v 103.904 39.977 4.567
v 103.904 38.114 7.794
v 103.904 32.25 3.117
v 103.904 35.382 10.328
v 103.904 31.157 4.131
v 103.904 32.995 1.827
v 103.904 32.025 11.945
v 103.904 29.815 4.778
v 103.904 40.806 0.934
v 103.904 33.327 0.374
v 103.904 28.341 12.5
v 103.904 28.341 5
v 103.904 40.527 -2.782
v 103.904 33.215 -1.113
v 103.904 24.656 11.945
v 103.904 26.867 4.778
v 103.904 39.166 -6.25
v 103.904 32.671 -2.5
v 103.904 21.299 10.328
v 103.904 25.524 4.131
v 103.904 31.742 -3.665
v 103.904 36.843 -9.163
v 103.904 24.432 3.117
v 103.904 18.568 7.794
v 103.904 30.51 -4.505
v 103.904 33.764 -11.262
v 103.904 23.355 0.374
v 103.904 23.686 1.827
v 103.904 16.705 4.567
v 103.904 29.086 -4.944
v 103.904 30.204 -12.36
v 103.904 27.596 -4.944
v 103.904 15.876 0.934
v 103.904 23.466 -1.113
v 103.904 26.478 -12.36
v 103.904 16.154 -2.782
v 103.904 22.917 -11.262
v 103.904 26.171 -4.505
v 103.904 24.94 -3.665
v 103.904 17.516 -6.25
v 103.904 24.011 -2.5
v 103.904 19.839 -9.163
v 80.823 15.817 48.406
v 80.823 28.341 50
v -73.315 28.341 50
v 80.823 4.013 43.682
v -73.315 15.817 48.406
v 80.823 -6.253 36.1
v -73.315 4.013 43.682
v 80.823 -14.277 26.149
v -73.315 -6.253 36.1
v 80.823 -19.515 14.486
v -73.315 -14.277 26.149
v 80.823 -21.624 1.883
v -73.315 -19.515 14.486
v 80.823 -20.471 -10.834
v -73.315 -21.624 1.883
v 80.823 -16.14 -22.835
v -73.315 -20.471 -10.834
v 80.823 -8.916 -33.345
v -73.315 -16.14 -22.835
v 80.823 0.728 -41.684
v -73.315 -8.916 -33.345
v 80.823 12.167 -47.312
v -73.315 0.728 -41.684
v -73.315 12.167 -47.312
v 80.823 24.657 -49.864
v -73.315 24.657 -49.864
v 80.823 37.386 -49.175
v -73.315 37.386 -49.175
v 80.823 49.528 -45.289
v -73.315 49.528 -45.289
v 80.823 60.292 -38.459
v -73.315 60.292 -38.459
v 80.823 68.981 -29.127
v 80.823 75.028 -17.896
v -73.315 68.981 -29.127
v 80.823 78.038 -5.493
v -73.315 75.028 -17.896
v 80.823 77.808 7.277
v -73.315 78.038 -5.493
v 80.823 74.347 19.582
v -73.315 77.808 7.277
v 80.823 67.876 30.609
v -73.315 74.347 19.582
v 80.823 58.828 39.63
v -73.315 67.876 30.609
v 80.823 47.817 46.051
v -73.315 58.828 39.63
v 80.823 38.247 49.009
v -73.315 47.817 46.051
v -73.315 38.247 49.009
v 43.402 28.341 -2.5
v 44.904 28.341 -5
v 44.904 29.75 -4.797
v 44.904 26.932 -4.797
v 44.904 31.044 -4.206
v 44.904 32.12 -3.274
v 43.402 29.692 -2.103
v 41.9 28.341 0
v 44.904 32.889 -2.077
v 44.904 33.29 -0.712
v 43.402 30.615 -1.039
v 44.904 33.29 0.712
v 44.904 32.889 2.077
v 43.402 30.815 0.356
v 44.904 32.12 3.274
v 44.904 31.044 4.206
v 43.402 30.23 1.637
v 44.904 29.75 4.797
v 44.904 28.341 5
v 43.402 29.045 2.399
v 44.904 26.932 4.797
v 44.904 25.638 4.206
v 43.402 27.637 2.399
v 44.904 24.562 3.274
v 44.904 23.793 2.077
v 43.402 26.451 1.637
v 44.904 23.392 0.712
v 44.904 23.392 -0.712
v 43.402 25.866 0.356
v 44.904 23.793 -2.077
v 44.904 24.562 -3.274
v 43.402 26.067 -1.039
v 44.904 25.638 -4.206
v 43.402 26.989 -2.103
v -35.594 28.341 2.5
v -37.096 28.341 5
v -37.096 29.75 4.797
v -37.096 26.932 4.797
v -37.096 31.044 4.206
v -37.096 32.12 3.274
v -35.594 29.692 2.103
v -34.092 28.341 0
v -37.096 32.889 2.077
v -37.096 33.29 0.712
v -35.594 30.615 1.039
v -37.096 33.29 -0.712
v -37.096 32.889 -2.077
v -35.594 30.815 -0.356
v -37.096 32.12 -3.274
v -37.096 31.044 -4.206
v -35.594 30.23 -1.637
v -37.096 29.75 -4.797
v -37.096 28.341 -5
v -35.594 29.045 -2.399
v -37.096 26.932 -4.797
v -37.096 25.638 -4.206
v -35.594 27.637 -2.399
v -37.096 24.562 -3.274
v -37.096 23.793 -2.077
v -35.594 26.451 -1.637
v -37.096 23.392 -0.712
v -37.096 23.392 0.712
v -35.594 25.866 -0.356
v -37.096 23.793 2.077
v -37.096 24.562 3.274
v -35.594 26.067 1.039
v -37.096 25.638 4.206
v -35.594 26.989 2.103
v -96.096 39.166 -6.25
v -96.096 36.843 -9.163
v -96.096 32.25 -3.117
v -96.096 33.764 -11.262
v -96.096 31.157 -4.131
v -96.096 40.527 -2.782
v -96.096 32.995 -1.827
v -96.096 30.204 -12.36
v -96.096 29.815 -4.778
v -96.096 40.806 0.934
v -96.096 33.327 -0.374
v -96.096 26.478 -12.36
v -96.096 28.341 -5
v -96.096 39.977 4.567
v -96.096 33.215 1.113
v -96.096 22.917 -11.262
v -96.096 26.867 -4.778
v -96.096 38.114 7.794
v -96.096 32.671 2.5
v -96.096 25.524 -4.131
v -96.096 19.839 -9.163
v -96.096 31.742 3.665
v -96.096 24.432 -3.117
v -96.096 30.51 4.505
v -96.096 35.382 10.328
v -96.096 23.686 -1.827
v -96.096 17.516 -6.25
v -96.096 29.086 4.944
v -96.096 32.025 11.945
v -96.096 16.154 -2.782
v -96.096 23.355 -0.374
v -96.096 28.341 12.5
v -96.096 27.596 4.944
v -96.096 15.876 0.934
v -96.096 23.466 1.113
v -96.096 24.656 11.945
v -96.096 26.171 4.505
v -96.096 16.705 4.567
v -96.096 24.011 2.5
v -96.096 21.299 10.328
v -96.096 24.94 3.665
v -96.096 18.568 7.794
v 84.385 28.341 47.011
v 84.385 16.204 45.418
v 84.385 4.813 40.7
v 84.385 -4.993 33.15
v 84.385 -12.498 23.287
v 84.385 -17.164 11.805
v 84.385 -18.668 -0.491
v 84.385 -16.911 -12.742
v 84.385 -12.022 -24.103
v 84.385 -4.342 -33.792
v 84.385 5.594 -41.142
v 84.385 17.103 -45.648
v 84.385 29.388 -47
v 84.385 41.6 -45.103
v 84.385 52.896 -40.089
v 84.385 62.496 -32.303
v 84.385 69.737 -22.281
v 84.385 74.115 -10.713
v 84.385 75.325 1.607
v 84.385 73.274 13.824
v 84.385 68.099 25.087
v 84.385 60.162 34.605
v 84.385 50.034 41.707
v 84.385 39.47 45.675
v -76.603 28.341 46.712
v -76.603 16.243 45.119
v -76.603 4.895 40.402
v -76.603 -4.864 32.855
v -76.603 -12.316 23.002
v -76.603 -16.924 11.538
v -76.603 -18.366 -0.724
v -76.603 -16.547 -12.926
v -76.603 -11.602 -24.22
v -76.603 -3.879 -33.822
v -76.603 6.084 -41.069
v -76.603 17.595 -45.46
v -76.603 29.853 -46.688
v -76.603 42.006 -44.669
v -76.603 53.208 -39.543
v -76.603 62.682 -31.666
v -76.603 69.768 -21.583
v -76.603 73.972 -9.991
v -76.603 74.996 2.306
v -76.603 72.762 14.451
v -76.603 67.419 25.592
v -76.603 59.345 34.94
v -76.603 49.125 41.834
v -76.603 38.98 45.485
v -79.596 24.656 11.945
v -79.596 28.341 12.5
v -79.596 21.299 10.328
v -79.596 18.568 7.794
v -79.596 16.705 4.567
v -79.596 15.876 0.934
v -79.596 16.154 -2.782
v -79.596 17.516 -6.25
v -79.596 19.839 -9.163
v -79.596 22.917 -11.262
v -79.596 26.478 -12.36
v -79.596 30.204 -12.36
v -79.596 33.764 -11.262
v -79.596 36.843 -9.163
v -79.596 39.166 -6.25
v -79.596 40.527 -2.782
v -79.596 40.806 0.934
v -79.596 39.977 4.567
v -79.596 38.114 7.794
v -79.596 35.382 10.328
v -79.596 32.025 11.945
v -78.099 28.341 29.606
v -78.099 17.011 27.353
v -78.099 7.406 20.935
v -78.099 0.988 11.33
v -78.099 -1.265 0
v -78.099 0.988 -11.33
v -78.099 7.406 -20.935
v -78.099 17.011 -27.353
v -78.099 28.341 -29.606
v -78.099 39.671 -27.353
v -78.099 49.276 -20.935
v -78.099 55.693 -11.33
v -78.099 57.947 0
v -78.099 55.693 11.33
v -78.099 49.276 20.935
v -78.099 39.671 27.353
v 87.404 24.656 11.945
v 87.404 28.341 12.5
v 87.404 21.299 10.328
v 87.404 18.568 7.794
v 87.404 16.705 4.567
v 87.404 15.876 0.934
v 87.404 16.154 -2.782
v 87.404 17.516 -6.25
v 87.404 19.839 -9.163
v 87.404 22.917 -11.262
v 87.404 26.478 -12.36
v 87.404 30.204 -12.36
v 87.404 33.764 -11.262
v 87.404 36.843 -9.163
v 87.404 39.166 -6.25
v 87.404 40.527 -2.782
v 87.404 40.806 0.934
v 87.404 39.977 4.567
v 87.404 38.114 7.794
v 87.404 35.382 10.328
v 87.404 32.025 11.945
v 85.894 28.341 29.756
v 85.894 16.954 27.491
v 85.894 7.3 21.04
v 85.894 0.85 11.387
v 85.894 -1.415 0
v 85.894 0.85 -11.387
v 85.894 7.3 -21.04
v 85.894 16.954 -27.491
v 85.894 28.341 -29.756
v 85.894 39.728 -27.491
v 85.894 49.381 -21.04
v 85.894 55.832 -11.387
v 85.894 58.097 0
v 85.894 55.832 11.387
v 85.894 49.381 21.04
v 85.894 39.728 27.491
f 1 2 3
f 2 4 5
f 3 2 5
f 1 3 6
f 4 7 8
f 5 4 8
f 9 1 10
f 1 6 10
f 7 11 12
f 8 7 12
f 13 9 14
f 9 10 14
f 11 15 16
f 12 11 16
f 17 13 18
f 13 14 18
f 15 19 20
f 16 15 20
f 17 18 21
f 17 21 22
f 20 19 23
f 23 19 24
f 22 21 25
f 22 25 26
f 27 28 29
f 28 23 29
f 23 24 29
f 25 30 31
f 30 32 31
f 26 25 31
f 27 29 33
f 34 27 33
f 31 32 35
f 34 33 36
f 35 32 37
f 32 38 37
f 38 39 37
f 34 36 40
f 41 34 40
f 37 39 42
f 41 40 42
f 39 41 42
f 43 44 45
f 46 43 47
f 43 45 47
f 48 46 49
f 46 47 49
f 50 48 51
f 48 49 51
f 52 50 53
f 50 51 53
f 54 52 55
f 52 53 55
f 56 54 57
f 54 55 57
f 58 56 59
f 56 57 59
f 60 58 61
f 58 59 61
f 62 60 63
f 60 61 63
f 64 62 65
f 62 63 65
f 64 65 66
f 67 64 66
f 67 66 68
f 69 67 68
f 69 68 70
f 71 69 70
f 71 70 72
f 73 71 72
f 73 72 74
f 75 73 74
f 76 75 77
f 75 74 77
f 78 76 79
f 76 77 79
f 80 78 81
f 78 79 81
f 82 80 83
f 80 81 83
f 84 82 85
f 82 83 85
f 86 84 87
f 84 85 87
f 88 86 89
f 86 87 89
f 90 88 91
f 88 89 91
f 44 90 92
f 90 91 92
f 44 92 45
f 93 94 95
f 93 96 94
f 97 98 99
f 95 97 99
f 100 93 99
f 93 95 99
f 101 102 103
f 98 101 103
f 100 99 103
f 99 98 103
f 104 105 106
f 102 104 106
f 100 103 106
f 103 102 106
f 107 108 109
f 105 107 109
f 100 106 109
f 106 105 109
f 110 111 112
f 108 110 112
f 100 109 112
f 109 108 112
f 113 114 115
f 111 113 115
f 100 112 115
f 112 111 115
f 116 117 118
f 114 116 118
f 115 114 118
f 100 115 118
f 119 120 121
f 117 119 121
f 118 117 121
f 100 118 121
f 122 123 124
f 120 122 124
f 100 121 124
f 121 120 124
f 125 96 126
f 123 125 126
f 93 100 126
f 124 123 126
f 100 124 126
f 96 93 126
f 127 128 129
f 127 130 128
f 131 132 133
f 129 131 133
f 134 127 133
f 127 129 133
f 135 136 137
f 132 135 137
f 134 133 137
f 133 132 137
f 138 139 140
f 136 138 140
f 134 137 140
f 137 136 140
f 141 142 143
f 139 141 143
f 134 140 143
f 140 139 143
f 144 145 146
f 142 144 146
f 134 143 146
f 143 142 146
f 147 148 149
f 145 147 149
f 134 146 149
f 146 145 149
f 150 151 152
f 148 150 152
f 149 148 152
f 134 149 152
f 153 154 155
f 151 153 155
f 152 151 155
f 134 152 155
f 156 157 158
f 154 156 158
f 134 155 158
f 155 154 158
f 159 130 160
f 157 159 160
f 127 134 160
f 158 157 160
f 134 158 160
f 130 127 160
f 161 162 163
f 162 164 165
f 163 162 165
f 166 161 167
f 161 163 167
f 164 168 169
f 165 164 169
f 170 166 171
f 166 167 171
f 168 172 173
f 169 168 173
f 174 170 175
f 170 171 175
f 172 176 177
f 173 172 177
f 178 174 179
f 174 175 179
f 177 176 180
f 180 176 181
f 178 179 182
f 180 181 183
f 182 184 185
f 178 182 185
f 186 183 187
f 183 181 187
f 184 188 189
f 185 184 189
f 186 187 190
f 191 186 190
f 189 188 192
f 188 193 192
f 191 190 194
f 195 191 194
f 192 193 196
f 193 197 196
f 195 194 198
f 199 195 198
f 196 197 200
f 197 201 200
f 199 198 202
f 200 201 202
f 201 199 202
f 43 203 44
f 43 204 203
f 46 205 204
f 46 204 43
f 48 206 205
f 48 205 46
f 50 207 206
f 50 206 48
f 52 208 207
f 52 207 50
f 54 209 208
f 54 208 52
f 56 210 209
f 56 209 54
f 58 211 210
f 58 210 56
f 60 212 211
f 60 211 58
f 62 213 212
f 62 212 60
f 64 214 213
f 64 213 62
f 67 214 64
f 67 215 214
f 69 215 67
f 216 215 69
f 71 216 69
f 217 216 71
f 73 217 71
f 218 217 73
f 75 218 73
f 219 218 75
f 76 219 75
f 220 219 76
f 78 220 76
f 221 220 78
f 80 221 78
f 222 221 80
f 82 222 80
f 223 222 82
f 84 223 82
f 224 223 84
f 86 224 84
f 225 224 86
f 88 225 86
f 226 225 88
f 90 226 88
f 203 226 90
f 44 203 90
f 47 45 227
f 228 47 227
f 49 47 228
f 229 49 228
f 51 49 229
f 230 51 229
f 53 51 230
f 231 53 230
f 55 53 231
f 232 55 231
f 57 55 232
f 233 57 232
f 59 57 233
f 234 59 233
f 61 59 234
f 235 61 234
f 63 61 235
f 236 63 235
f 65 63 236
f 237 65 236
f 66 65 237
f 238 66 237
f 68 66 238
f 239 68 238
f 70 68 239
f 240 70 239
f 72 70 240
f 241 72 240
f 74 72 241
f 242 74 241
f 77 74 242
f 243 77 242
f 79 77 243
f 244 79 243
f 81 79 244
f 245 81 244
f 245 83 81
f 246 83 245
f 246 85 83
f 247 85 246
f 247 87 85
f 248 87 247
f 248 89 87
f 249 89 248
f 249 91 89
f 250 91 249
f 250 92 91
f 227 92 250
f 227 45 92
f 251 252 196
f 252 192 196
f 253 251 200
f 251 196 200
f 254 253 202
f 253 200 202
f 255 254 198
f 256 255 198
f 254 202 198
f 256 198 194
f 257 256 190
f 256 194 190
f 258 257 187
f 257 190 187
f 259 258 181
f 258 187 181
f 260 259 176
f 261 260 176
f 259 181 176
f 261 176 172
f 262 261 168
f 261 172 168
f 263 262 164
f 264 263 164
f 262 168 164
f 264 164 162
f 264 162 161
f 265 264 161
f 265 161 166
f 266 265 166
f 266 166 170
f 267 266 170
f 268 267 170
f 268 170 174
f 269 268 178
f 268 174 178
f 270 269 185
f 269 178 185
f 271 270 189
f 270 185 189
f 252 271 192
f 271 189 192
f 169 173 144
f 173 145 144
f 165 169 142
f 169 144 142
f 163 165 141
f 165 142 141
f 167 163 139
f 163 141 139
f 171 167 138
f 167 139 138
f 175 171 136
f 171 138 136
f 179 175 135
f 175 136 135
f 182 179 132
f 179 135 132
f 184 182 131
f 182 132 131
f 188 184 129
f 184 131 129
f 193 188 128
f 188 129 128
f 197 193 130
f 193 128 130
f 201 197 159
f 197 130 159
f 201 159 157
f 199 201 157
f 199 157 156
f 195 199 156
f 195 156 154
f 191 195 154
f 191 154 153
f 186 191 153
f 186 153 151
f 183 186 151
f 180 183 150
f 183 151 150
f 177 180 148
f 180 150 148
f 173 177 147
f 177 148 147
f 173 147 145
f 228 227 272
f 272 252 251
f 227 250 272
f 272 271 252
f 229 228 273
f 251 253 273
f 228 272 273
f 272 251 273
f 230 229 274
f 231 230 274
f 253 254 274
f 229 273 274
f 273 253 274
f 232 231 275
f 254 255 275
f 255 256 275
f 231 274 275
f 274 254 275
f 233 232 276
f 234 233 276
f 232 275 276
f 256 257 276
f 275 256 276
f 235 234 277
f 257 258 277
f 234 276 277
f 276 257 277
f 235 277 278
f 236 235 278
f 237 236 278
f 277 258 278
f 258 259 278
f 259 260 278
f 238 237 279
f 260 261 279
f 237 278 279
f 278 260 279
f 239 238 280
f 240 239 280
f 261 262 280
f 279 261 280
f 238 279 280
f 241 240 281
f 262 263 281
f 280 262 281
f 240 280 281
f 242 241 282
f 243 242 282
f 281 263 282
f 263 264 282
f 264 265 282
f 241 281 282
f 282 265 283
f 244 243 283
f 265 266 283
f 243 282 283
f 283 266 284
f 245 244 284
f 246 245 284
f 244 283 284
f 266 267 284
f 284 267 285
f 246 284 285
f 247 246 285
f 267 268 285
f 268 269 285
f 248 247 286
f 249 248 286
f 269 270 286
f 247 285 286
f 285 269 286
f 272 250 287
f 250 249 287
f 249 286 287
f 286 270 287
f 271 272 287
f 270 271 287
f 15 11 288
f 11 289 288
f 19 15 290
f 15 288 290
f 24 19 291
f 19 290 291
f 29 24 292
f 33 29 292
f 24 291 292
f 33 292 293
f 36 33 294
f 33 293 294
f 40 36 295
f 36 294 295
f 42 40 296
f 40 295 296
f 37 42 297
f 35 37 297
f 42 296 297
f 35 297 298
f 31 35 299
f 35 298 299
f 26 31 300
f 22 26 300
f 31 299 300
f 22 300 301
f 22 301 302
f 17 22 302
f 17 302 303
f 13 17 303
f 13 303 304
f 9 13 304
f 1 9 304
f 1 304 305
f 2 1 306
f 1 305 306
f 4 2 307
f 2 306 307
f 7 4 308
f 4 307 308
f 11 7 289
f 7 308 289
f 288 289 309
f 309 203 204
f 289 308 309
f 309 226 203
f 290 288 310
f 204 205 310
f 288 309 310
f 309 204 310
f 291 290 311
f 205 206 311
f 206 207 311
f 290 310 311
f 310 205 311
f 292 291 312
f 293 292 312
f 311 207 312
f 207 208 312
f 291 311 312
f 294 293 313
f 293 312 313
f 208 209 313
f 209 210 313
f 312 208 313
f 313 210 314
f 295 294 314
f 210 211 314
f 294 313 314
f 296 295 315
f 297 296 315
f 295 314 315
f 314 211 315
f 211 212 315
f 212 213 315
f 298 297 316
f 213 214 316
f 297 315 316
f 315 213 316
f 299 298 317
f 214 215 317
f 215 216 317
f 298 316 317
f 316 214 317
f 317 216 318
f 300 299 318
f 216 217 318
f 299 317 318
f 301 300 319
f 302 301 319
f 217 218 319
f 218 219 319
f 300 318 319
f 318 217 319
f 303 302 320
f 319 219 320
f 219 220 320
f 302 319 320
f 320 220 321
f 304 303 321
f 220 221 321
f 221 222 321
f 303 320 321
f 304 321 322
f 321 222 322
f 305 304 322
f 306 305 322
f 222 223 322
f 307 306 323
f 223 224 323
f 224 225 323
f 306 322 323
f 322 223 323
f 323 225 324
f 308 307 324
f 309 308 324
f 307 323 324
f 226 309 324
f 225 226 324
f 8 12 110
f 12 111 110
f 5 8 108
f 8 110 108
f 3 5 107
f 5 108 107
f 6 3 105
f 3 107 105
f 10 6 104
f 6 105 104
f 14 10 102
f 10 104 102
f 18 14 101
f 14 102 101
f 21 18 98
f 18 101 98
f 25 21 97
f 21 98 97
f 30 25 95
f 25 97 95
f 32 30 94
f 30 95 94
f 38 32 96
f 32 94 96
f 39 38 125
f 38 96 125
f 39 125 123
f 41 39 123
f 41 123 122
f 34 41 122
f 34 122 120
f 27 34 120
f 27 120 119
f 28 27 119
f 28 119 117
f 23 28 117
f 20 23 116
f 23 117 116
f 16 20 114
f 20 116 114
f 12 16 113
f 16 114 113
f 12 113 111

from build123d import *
from OCP.BRepFilletAPI import BRepFilletAPI_MakeChamfer

# Parameters (mm, degrees)
CHAMFER1_SIZE              = 3
CHAMFER1_SIZE2             = 3.300188603
F_10_0MM_DOWEL_HOLE1_D     = 10
F_10_0MM_DOWEL_HOLE1_DEPTH = 59
F_10_0MM_DOWEL_HOLE1_TIP   = 3.004303095
F_10_0MM_DOWEL_HOLE2_D     = 10
F_10_0MM_DOWEL_HOLE2_DEPTH = 59
F_10_0MM_DOWEL_HOLE2_TIP   = 3.004303095


with BuildPart() as part:
    # Sketch1 → Revolve1 (revolve)
    with BuildSketch(Plane.XY):
        Polygon((-96.096096096, 28.340840841), (103.903903904, 28.340840841), (103.903903904, 40.840840841), (87.403903904, 40.840840841), (84.123079022, 78.340840841), (-76.315271214, 78.340840841), (-79.596096096, 40.840840841), (-96.096096096, 40.840840841), align=None)
    revolve(axis=Axis((-96.096096096, 28.340840841, 0), (1, 0, 0)))

    # Chamfer1: one chamfer whose edges measure the first distance from different faces: ONE call of the kernel's chamfer builder (chamfer() names one face for all edges)
    chamfer1_edges_1 = [part.edges().sort_by_distance(p)[0] for p in [
        (84.123079022, -21.659159159, 0),
    ]]
    chamfer1_side_1 = [part.faces().sort_by_distance(p)[0] for p in [
        (85.763491463, -2.909159159, 0),
    ]]
    chamfer1_edges_2 = [part.edges().sort_by_distance(p)[0] for p in [
        (-76.315271214, -21.659159159, 0),
    ]]
    chamfer1_side_2 = [part.faces().sort_by_distance(p)[0] for p in [
        (3.903903904, -21.659159159, 0),
    ]]
    chamfer1 = BRepFilletAPI_MakeChamfer(part.part.solid().wrapped)
    for e in chamfer1_edges_1:
        chamfer1.Add(CHAMFER1_SIZE, CHAMFER1_SIZE2, e.wrapped, chamfer1_side_1[0].wrapped)  # the first distance lies on this face
    for e in chamfer1_edges_2:
        chamfer1.Add(CHAMFER1_SIZE, CHAMFER1_SIZE2, e.wrapped, chamfer1_side_2[0].wrapped)  # the first distance lies on this face
    add(Compound.cast(chamfer1.Shape()), mode=Mode.REPLACE)

    # Ø10.0mm Dowel Hole1
    with Locations(Plane(origin=(103.903903904, 0, 0), x_dir=(0, 0, -1), z_dir=(1, 0, 0))):
        with Locations((0, 28.340840841)):
            Hole(F_10_0MM_DOWEL_HOLE1_D / 2, depth=F_10_0MM_DOWEL_HOLE1_DEPTH)
            with Locations((0, 0, -(F_10_0MM_DOWEL_HOLE1_DEPTH + F_10_0MM_DOWEL_HOLE1_TIP / 2))):  # 118° drill point
                Cone(0, F_10_0MM_DOWEL_HOLE1_D / 2, F_10_0MM_DOWEL_HOLE1_TIP, mode=Mode.SUBTRACT)

    # Ø10.0mm Dowel Hole2
    with Locations(Plane.ZY.offset(96.096096096)):
        with Locations((0, 28.340840841)):
            Hole(F_10_0MM_DOWEL_HOLE2_D / 2, depth=F_10_0MM_DOWEL_HOLE2_DEPTH)
            with Locations((0, 0, -(F_10_0MM_DOWEL_HOLE2_DEPTH + F_10_0MM_DOWEL_HOLE2_TIP / 2))):  # 118° drill point
                Cone(0, F_10_0MM_DOWEL_HOLE2_D / 2, F_10_0MM_DOWEL_HOLE2_TIP, mode=Mode.SUBTRACT)


solid = part.part
